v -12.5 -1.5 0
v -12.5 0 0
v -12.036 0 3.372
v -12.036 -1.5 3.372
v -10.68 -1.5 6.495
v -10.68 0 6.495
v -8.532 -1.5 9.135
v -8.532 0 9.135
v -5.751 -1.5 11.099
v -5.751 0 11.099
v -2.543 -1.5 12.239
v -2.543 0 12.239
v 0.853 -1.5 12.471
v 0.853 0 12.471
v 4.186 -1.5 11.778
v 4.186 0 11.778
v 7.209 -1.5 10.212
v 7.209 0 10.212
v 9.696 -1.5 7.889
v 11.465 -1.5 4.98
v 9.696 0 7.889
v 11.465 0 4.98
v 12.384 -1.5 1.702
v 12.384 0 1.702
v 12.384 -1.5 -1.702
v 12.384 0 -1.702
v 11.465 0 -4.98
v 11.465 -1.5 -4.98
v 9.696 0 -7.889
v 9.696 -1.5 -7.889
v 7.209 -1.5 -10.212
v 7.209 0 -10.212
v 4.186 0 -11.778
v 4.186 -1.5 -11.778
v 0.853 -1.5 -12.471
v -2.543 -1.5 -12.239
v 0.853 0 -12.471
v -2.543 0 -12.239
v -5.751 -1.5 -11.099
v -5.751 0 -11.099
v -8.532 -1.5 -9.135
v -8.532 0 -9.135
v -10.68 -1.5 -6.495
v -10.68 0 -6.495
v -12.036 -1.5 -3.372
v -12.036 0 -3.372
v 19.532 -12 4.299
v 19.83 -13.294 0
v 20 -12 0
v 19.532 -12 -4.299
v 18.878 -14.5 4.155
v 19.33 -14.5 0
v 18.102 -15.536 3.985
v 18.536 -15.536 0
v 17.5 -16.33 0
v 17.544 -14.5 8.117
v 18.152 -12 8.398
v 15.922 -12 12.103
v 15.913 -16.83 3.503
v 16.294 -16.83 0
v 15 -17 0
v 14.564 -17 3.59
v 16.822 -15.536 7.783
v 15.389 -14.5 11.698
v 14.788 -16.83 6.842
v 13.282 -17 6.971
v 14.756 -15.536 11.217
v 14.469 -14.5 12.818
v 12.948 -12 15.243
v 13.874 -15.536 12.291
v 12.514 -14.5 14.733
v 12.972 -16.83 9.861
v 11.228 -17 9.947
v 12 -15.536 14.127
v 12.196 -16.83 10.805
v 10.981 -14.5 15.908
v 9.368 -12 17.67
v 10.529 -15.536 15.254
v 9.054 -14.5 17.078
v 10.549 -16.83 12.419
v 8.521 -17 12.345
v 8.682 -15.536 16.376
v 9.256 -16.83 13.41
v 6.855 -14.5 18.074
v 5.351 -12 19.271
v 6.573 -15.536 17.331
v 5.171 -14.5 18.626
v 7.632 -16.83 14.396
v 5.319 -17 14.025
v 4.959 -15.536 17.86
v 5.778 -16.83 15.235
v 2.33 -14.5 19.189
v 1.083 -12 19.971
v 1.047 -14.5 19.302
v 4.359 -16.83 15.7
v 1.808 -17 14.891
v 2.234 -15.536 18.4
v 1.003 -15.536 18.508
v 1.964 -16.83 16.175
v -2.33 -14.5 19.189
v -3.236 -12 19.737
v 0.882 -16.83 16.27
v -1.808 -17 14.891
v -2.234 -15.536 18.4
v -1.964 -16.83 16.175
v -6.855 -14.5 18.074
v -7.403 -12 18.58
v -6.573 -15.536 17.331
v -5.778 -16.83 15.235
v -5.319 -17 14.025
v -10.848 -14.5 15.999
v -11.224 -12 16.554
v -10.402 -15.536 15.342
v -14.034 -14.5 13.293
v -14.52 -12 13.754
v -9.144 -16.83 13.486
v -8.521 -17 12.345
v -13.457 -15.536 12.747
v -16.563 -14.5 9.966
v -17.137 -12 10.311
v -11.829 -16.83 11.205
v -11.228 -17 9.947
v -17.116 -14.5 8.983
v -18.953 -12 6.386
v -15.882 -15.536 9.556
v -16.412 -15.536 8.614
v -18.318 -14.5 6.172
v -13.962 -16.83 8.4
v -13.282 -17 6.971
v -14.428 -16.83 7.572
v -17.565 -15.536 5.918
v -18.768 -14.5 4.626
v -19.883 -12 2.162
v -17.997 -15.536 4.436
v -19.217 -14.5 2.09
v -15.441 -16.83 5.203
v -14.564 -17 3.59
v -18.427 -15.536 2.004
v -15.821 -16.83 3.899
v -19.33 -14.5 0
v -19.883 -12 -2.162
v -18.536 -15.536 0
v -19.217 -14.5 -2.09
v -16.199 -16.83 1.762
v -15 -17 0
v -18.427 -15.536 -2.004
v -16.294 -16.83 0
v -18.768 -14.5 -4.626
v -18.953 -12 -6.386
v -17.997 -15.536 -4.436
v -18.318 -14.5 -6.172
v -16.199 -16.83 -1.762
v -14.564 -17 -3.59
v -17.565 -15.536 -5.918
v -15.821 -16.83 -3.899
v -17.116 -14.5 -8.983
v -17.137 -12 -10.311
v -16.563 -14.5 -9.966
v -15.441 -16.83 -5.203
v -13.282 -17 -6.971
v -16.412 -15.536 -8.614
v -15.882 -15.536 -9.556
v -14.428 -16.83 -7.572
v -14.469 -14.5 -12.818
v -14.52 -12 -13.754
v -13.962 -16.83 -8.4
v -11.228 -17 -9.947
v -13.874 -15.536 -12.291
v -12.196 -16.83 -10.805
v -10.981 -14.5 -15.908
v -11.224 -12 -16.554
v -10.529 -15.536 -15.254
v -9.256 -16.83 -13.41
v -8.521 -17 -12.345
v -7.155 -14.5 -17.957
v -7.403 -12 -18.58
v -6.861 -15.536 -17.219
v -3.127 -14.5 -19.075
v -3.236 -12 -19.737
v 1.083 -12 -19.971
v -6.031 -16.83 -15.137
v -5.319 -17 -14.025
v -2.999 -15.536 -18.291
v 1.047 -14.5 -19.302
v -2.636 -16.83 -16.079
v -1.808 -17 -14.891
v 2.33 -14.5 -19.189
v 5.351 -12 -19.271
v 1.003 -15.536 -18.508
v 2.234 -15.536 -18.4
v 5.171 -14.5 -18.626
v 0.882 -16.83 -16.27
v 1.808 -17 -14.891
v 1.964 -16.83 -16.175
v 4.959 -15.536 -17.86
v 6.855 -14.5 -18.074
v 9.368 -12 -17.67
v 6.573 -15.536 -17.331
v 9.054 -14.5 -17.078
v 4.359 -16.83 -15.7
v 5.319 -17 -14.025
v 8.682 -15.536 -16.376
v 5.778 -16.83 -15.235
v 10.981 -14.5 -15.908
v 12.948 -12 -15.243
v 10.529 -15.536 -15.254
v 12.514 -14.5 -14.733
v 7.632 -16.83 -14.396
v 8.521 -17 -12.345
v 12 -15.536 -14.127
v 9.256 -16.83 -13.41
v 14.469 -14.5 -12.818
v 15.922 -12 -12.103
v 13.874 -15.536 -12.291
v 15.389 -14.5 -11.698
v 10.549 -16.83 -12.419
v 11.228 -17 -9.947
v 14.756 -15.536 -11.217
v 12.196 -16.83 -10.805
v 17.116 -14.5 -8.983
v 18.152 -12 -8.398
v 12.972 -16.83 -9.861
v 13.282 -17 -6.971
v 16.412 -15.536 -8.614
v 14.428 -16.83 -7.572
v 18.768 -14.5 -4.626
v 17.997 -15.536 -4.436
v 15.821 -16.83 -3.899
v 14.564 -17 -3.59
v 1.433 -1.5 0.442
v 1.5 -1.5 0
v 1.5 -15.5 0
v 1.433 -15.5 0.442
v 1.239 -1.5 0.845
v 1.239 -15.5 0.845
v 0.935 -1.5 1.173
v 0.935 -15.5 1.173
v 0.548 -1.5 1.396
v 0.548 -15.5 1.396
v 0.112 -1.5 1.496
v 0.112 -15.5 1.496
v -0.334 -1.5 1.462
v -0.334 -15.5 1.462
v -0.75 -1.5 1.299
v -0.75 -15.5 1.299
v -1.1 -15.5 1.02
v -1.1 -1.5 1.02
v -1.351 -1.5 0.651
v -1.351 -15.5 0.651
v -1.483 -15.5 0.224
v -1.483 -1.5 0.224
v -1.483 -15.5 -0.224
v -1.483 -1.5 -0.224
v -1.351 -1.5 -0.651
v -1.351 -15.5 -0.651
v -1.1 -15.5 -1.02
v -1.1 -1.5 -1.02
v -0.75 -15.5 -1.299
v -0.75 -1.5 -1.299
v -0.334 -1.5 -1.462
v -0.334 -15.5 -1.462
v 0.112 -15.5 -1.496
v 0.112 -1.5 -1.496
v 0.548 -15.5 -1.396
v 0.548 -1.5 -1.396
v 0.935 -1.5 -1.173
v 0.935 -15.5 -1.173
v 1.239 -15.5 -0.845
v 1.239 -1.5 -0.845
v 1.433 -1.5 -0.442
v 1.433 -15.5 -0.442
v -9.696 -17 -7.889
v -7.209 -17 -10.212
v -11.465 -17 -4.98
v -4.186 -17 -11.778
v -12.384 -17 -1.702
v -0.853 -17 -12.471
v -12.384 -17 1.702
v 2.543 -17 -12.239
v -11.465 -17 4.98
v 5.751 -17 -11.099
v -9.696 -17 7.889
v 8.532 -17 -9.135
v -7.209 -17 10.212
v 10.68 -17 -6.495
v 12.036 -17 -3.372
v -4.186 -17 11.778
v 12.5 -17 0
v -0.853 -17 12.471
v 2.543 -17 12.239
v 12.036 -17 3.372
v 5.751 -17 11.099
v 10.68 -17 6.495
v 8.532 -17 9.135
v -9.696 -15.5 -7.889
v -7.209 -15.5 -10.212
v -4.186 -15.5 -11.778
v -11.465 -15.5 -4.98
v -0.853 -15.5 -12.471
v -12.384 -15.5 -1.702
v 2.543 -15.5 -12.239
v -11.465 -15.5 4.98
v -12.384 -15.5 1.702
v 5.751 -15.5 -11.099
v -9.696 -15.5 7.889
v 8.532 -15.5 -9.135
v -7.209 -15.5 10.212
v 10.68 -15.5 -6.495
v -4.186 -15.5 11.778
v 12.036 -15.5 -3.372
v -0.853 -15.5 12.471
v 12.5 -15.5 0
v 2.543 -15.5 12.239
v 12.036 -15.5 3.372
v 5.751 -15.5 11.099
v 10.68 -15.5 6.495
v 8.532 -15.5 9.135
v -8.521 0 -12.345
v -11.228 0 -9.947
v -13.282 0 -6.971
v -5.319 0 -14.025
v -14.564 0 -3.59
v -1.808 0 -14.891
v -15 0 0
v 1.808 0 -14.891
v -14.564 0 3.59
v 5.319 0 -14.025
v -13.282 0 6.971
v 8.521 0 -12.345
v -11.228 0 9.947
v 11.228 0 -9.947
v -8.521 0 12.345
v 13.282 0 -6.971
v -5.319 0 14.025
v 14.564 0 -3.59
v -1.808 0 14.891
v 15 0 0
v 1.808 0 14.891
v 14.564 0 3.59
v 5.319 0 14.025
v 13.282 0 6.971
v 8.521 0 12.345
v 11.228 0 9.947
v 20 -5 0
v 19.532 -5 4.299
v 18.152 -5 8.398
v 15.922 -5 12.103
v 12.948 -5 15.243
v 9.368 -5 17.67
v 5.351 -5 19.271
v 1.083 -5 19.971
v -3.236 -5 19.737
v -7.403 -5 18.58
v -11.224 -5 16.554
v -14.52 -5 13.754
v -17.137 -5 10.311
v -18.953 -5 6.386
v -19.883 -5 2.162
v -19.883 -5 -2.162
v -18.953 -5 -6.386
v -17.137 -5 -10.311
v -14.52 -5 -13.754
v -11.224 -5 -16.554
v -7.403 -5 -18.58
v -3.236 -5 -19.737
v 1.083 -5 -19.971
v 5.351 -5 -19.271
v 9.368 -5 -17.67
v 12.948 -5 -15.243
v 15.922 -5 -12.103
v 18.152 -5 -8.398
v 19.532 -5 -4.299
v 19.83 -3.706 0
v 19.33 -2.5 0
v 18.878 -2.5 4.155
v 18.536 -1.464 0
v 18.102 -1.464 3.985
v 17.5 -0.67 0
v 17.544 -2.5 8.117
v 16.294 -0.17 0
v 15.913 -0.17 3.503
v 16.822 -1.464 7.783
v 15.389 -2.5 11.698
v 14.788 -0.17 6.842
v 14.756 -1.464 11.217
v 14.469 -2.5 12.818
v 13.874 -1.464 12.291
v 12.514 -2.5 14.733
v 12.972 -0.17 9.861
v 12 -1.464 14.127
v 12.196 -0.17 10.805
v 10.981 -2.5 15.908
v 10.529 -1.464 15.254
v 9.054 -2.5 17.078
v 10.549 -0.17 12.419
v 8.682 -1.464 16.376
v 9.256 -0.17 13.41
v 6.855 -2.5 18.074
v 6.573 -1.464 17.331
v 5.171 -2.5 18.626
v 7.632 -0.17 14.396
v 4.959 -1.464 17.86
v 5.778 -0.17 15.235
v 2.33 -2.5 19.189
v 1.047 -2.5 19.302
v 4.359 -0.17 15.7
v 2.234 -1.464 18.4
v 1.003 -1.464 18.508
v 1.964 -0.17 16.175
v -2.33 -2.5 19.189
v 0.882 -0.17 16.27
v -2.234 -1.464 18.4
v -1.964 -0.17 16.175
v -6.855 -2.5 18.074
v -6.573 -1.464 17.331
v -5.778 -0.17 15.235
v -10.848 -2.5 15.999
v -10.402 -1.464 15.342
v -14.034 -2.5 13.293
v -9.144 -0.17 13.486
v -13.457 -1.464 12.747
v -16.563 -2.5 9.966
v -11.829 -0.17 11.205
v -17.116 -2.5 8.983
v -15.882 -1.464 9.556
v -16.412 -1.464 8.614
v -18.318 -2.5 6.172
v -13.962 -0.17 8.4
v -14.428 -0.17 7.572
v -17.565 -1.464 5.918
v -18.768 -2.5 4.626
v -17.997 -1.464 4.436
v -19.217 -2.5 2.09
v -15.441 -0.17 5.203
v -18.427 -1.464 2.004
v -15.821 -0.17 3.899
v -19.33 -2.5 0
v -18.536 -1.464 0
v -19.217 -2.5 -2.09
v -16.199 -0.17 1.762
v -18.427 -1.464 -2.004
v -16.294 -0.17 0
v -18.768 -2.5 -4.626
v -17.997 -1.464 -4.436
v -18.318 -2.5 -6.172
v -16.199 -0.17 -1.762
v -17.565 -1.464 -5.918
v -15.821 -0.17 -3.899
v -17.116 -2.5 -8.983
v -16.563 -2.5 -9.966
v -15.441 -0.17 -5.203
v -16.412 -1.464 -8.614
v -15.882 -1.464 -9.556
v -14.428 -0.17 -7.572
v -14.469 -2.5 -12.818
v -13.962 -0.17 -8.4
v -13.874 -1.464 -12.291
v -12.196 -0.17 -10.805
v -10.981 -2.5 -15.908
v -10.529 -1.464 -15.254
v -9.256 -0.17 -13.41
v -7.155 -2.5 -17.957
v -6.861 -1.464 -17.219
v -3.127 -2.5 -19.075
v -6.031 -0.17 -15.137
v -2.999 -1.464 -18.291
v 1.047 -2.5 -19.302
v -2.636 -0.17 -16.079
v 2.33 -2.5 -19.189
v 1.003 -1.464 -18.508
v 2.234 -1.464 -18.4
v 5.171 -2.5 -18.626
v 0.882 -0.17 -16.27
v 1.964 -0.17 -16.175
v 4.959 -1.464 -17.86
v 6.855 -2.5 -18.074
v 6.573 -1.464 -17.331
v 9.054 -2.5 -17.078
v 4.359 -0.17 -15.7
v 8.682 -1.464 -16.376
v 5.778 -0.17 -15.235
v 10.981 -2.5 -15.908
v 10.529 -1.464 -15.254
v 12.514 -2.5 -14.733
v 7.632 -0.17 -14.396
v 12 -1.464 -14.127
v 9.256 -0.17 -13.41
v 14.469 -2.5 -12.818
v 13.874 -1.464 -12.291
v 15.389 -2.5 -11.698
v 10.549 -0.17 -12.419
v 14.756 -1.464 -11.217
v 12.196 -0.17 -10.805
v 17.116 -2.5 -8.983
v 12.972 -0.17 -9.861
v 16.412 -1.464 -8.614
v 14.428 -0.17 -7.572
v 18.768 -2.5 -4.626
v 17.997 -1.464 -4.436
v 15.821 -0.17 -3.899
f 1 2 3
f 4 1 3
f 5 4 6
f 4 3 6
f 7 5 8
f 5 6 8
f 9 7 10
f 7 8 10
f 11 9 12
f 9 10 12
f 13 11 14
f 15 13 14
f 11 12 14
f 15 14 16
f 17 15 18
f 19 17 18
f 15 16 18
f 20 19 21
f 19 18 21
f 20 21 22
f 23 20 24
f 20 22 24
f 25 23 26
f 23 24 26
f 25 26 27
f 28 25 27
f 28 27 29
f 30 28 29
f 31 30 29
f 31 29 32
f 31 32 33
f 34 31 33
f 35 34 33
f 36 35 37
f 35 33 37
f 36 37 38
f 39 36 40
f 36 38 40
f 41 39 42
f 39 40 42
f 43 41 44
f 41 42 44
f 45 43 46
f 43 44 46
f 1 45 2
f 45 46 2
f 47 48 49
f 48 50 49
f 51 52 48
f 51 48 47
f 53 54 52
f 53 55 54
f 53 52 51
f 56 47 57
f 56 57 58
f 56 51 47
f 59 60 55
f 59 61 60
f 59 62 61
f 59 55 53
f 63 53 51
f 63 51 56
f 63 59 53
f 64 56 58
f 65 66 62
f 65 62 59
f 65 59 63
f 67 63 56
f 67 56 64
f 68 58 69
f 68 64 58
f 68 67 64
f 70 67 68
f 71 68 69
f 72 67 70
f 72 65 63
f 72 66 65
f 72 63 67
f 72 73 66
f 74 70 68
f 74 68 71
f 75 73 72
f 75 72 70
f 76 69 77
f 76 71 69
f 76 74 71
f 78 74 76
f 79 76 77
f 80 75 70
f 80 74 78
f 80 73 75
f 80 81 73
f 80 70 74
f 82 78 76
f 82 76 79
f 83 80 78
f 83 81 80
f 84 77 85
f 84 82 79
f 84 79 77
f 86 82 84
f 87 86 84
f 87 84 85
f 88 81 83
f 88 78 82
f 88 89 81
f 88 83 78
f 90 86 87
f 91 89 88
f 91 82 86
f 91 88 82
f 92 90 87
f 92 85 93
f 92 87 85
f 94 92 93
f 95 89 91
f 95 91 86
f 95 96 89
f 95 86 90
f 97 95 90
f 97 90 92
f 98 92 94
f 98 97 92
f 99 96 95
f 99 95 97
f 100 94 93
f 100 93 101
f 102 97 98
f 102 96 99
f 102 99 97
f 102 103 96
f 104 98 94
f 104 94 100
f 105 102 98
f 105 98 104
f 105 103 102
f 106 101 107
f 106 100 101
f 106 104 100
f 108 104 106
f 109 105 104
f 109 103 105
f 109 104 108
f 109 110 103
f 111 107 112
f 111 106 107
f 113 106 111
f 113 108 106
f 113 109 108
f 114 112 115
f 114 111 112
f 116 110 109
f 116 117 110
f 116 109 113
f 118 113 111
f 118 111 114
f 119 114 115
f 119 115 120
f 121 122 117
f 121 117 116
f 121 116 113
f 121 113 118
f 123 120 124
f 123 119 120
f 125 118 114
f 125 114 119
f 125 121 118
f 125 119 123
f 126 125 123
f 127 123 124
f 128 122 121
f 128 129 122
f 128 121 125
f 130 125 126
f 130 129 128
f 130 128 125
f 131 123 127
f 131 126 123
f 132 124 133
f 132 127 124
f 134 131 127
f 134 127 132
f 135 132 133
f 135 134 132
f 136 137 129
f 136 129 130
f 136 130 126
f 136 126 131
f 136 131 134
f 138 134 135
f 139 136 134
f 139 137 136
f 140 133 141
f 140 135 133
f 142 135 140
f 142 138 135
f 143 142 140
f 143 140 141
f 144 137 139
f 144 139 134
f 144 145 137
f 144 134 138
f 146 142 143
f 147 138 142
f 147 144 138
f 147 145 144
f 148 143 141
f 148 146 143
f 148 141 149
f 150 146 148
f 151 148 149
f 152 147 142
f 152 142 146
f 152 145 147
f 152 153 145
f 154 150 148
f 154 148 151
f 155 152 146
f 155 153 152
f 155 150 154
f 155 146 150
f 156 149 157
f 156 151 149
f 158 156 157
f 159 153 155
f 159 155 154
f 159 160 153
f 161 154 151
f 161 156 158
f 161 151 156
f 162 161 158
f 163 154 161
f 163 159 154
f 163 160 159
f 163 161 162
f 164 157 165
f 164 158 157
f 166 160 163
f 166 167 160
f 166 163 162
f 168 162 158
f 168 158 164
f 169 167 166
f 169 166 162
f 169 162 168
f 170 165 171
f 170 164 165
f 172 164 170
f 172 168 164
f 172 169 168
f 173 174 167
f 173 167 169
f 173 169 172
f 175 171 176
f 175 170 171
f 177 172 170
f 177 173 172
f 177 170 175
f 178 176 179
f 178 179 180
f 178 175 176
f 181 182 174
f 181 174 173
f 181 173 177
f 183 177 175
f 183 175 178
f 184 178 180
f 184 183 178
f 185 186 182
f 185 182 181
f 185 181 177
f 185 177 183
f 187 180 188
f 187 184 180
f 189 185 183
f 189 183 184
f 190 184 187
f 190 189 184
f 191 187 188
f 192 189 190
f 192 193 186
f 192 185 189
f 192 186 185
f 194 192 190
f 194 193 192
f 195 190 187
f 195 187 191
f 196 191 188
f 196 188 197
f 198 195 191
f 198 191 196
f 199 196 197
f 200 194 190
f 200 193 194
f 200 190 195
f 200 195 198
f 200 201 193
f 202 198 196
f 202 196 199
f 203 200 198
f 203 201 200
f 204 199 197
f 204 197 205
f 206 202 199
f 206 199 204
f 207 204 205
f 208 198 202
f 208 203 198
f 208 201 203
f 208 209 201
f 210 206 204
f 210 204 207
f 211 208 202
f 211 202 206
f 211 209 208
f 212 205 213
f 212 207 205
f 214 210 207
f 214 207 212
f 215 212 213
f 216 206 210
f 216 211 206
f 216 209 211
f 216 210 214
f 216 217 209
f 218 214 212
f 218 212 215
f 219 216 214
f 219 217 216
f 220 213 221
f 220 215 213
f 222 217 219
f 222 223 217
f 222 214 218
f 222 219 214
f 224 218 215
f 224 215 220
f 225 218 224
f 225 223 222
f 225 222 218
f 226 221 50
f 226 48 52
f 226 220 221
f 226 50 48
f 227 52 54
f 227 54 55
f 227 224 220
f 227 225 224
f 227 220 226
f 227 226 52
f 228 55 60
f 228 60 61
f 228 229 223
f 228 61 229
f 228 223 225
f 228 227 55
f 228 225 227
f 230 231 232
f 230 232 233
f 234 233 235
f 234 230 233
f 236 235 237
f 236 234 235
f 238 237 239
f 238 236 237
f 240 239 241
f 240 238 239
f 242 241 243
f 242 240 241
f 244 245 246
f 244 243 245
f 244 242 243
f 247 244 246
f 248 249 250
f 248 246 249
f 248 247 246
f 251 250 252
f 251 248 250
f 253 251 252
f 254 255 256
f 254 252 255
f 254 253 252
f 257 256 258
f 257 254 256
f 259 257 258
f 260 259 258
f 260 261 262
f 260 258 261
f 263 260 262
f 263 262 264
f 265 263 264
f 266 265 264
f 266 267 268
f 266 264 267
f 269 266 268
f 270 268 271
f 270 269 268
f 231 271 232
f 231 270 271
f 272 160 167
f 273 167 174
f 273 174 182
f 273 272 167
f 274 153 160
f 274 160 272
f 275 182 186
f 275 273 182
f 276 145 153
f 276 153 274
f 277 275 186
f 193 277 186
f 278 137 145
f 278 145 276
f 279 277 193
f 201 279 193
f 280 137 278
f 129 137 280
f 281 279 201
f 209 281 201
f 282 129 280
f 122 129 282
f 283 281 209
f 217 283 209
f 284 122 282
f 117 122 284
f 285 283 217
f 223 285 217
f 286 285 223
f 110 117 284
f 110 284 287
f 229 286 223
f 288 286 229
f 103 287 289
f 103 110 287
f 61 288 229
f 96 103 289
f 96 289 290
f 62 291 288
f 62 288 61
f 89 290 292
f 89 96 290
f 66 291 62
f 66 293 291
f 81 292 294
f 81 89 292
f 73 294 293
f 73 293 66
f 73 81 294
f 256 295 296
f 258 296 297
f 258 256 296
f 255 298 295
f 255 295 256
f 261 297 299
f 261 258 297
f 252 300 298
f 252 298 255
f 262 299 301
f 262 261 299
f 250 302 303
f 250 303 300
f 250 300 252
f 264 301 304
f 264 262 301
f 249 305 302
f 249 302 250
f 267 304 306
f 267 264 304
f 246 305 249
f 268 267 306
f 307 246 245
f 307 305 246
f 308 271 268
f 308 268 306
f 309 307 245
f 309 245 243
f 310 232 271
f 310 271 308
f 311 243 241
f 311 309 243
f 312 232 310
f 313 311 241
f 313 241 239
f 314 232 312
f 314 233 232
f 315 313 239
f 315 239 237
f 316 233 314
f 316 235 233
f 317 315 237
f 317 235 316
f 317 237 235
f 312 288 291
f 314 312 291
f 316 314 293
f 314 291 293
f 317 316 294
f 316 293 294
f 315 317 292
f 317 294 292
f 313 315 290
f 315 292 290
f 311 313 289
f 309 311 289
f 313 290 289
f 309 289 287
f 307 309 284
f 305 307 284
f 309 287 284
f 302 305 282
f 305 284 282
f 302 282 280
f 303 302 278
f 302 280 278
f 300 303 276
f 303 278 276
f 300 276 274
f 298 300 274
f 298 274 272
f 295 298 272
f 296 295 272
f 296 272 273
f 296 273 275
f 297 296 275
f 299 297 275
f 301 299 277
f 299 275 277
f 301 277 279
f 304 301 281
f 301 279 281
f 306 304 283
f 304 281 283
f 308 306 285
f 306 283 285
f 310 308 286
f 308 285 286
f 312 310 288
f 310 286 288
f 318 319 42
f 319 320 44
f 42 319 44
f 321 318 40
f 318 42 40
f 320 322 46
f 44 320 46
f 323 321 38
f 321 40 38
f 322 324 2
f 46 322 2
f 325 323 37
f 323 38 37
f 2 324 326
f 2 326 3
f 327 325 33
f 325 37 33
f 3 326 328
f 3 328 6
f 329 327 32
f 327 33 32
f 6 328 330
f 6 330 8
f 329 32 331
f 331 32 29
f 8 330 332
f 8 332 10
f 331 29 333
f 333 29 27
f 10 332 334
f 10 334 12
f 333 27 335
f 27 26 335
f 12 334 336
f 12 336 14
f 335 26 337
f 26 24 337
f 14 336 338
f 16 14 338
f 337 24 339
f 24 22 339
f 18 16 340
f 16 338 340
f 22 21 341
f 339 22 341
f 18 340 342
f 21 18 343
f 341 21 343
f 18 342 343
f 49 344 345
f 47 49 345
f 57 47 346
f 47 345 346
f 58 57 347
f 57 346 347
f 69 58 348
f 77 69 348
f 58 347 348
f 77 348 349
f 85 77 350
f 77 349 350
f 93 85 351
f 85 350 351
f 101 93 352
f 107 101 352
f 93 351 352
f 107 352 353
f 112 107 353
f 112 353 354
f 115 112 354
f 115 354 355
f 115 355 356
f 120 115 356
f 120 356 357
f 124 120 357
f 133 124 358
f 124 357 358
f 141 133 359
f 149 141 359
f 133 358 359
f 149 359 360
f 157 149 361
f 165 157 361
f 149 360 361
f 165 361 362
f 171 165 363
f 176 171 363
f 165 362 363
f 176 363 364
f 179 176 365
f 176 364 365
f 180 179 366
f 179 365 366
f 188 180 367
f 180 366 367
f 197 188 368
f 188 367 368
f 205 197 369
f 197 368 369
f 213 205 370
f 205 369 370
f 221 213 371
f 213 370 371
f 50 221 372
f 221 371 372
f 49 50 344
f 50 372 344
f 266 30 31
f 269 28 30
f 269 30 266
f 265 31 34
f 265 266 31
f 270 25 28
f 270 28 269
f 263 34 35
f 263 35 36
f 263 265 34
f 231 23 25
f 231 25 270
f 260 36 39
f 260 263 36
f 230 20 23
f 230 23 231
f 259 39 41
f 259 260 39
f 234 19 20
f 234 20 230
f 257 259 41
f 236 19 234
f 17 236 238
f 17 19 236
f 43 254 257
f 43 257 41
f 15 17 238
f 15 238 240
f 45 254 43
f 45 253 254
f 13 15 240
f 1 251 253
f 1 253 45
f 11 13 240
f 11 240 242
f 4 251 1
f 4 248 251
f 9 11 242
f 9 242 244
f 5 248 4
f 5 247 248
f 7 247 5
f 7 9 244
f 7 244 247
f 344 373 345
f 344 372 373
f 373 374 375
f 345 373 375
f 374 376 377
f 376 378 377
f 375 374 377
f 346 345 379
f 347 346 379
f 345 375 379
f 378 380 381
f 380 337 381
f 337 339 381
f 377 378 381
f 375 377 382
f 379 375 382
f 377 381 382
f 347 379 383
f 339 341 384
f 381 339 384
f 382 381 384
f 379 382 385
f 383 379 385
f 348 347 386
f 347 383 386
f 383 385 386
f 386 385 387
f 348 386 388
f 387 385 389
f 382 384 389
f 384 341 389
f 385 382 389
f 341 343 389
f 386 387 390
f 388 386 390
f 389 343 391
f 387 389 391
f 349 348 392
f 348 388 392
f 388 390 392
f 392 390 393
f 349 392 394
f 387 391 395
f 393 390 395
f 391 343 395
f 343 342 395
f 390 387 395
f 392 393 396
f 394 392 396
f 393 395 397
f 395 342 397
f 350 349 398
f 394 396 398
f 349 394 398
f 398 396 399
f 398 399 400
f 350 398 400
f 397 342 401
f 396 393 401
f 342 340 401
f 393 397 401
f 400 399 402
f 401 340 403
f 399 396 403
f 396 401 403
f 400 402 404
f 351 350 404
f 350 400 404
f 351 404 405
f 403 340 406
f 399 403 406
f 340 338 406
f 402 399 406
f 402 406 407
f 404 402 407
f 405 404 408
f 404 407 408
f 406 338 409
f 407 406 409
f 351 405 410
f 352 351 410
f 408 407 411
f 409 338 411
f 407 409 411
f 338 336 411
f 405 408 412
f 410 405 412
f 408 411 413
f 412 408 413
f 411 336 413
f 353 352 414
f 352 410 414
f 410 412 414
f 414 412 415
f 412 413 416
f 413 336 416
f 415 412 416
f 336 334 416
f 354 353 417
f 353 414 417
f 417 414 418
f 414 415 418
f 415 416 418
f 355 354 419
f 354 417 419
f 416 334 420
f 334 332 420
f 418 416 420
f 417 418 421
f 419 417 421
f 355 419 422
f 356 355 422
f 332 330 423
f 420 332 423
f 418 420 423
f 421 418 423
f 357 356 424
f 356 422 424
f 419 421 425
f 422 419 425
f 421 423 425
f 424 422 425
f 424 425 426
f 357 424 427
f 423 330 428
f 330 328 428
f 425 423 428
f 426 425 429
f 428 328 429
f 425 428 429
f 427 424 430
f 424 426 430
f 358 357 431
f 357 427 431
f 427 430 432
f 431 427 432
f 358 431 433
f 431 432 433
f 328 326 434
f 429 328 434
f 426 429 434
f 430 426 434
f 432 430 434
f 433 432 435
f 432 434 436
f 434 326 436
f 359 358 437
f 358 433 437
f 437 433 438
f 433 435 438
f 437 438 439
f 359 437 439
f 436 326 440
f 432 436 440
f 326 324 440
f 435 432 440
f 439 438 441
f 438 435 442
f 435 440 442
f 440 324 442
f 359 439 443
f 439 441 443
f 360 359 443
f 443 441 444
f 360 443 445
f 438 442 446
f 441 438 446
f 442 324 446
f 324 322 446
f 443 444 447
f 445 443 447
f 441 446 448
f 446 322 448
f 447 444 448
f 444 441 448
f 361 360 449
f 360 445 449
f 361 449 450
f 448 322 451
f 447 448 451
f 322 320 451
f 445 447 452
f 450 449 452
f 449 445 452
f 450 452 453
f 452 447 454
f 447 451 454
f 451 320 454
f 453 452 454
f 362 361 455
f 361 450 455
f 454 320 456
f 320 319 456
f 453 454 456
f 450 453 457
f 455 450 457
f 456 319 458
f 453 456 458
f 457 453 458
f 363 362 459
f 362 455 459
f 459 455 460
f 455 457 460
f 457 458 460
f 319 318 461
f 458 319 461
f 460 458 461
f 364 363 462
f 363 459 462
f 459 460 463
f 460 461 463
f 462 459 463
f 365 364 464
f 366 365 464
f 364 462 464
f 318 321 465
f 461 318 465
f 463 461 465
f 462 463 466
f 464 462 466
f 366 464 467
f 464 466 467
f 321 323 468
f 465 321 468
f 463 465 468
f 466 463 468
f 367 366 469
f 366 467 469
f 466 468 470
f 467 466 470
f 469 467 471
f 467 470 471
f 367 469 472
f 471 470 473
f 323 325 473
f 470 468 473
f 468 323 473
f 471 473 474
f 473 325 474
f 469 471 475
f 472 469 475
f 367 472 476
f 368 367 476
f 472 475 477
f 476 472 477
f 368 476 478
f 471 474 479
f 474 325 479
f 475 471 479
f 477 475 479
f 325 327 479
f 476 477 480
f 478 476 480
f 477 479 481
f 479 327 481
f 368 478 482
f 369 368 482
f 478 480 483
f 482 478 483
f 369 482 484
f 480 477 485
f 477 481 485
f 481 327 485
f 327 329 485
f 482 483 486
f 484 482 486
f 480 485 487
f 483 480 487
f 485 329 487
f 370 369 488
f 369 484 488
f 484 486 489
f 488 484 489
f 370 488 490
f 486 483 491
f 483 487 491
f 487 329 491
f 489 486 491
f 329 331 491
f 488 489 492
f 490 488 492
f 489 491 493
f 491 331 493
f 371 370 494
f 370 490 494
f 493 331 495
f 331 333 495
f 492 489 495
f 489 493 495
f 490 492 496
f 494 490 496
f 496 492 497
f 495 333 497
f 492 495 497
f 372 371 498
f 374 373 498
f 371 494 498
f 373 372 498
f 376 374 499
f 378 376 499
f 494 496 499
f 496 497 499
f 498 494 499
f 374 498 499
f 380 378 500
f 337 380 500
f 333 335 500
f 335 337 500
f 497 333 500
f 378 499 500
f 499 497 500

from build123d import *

# Parameters (mm, degrees)
F0_R     = 20
F0_R_2   = 1.5
F1_DEPTH = 17
F2_R     = 12.5
F3_DEPTH = 1.5
F4_R     = 12.5
F5_DEPTH = 1.5
F6_R     = 5


with BuildPart() as f1:
    # F0 (on Front) → F1 (new body)
    with BuildSketch(Plane.XZ):
        Circle(F0_R)
        Circle(F0_R_2, mode=Mode.SUBTRACT)
    extrude(amount=F1_DEPTH)

    # F2 (on face) → F3 (cut)
    with BuildSketch(Plane.XZ.offset(17)):
        Circle(F2_R)
    extrude(amount=-F3_DEPTH, mode=Mode.SUBTRACT)

    # F4 (on face) → F5 (cut)
    with BuildSketch(Plane(origin=(0, 0, 0), x_dir=(-1, 0, 0), z_dir=(0, 1, 0))):
        Circle(F4_R)
    extrude(amount=-F5_DEPTH, mode=Mode.SUBTRACT)

    # F6
    f6_edges = [f1.edges().sort_by_distance(p)[0] for p in [
        (-20, 0, 0),
        (-20, -17, 0),
    ]]
    fillet(f6_edges, radius=F6_R)


solid = f1.part
